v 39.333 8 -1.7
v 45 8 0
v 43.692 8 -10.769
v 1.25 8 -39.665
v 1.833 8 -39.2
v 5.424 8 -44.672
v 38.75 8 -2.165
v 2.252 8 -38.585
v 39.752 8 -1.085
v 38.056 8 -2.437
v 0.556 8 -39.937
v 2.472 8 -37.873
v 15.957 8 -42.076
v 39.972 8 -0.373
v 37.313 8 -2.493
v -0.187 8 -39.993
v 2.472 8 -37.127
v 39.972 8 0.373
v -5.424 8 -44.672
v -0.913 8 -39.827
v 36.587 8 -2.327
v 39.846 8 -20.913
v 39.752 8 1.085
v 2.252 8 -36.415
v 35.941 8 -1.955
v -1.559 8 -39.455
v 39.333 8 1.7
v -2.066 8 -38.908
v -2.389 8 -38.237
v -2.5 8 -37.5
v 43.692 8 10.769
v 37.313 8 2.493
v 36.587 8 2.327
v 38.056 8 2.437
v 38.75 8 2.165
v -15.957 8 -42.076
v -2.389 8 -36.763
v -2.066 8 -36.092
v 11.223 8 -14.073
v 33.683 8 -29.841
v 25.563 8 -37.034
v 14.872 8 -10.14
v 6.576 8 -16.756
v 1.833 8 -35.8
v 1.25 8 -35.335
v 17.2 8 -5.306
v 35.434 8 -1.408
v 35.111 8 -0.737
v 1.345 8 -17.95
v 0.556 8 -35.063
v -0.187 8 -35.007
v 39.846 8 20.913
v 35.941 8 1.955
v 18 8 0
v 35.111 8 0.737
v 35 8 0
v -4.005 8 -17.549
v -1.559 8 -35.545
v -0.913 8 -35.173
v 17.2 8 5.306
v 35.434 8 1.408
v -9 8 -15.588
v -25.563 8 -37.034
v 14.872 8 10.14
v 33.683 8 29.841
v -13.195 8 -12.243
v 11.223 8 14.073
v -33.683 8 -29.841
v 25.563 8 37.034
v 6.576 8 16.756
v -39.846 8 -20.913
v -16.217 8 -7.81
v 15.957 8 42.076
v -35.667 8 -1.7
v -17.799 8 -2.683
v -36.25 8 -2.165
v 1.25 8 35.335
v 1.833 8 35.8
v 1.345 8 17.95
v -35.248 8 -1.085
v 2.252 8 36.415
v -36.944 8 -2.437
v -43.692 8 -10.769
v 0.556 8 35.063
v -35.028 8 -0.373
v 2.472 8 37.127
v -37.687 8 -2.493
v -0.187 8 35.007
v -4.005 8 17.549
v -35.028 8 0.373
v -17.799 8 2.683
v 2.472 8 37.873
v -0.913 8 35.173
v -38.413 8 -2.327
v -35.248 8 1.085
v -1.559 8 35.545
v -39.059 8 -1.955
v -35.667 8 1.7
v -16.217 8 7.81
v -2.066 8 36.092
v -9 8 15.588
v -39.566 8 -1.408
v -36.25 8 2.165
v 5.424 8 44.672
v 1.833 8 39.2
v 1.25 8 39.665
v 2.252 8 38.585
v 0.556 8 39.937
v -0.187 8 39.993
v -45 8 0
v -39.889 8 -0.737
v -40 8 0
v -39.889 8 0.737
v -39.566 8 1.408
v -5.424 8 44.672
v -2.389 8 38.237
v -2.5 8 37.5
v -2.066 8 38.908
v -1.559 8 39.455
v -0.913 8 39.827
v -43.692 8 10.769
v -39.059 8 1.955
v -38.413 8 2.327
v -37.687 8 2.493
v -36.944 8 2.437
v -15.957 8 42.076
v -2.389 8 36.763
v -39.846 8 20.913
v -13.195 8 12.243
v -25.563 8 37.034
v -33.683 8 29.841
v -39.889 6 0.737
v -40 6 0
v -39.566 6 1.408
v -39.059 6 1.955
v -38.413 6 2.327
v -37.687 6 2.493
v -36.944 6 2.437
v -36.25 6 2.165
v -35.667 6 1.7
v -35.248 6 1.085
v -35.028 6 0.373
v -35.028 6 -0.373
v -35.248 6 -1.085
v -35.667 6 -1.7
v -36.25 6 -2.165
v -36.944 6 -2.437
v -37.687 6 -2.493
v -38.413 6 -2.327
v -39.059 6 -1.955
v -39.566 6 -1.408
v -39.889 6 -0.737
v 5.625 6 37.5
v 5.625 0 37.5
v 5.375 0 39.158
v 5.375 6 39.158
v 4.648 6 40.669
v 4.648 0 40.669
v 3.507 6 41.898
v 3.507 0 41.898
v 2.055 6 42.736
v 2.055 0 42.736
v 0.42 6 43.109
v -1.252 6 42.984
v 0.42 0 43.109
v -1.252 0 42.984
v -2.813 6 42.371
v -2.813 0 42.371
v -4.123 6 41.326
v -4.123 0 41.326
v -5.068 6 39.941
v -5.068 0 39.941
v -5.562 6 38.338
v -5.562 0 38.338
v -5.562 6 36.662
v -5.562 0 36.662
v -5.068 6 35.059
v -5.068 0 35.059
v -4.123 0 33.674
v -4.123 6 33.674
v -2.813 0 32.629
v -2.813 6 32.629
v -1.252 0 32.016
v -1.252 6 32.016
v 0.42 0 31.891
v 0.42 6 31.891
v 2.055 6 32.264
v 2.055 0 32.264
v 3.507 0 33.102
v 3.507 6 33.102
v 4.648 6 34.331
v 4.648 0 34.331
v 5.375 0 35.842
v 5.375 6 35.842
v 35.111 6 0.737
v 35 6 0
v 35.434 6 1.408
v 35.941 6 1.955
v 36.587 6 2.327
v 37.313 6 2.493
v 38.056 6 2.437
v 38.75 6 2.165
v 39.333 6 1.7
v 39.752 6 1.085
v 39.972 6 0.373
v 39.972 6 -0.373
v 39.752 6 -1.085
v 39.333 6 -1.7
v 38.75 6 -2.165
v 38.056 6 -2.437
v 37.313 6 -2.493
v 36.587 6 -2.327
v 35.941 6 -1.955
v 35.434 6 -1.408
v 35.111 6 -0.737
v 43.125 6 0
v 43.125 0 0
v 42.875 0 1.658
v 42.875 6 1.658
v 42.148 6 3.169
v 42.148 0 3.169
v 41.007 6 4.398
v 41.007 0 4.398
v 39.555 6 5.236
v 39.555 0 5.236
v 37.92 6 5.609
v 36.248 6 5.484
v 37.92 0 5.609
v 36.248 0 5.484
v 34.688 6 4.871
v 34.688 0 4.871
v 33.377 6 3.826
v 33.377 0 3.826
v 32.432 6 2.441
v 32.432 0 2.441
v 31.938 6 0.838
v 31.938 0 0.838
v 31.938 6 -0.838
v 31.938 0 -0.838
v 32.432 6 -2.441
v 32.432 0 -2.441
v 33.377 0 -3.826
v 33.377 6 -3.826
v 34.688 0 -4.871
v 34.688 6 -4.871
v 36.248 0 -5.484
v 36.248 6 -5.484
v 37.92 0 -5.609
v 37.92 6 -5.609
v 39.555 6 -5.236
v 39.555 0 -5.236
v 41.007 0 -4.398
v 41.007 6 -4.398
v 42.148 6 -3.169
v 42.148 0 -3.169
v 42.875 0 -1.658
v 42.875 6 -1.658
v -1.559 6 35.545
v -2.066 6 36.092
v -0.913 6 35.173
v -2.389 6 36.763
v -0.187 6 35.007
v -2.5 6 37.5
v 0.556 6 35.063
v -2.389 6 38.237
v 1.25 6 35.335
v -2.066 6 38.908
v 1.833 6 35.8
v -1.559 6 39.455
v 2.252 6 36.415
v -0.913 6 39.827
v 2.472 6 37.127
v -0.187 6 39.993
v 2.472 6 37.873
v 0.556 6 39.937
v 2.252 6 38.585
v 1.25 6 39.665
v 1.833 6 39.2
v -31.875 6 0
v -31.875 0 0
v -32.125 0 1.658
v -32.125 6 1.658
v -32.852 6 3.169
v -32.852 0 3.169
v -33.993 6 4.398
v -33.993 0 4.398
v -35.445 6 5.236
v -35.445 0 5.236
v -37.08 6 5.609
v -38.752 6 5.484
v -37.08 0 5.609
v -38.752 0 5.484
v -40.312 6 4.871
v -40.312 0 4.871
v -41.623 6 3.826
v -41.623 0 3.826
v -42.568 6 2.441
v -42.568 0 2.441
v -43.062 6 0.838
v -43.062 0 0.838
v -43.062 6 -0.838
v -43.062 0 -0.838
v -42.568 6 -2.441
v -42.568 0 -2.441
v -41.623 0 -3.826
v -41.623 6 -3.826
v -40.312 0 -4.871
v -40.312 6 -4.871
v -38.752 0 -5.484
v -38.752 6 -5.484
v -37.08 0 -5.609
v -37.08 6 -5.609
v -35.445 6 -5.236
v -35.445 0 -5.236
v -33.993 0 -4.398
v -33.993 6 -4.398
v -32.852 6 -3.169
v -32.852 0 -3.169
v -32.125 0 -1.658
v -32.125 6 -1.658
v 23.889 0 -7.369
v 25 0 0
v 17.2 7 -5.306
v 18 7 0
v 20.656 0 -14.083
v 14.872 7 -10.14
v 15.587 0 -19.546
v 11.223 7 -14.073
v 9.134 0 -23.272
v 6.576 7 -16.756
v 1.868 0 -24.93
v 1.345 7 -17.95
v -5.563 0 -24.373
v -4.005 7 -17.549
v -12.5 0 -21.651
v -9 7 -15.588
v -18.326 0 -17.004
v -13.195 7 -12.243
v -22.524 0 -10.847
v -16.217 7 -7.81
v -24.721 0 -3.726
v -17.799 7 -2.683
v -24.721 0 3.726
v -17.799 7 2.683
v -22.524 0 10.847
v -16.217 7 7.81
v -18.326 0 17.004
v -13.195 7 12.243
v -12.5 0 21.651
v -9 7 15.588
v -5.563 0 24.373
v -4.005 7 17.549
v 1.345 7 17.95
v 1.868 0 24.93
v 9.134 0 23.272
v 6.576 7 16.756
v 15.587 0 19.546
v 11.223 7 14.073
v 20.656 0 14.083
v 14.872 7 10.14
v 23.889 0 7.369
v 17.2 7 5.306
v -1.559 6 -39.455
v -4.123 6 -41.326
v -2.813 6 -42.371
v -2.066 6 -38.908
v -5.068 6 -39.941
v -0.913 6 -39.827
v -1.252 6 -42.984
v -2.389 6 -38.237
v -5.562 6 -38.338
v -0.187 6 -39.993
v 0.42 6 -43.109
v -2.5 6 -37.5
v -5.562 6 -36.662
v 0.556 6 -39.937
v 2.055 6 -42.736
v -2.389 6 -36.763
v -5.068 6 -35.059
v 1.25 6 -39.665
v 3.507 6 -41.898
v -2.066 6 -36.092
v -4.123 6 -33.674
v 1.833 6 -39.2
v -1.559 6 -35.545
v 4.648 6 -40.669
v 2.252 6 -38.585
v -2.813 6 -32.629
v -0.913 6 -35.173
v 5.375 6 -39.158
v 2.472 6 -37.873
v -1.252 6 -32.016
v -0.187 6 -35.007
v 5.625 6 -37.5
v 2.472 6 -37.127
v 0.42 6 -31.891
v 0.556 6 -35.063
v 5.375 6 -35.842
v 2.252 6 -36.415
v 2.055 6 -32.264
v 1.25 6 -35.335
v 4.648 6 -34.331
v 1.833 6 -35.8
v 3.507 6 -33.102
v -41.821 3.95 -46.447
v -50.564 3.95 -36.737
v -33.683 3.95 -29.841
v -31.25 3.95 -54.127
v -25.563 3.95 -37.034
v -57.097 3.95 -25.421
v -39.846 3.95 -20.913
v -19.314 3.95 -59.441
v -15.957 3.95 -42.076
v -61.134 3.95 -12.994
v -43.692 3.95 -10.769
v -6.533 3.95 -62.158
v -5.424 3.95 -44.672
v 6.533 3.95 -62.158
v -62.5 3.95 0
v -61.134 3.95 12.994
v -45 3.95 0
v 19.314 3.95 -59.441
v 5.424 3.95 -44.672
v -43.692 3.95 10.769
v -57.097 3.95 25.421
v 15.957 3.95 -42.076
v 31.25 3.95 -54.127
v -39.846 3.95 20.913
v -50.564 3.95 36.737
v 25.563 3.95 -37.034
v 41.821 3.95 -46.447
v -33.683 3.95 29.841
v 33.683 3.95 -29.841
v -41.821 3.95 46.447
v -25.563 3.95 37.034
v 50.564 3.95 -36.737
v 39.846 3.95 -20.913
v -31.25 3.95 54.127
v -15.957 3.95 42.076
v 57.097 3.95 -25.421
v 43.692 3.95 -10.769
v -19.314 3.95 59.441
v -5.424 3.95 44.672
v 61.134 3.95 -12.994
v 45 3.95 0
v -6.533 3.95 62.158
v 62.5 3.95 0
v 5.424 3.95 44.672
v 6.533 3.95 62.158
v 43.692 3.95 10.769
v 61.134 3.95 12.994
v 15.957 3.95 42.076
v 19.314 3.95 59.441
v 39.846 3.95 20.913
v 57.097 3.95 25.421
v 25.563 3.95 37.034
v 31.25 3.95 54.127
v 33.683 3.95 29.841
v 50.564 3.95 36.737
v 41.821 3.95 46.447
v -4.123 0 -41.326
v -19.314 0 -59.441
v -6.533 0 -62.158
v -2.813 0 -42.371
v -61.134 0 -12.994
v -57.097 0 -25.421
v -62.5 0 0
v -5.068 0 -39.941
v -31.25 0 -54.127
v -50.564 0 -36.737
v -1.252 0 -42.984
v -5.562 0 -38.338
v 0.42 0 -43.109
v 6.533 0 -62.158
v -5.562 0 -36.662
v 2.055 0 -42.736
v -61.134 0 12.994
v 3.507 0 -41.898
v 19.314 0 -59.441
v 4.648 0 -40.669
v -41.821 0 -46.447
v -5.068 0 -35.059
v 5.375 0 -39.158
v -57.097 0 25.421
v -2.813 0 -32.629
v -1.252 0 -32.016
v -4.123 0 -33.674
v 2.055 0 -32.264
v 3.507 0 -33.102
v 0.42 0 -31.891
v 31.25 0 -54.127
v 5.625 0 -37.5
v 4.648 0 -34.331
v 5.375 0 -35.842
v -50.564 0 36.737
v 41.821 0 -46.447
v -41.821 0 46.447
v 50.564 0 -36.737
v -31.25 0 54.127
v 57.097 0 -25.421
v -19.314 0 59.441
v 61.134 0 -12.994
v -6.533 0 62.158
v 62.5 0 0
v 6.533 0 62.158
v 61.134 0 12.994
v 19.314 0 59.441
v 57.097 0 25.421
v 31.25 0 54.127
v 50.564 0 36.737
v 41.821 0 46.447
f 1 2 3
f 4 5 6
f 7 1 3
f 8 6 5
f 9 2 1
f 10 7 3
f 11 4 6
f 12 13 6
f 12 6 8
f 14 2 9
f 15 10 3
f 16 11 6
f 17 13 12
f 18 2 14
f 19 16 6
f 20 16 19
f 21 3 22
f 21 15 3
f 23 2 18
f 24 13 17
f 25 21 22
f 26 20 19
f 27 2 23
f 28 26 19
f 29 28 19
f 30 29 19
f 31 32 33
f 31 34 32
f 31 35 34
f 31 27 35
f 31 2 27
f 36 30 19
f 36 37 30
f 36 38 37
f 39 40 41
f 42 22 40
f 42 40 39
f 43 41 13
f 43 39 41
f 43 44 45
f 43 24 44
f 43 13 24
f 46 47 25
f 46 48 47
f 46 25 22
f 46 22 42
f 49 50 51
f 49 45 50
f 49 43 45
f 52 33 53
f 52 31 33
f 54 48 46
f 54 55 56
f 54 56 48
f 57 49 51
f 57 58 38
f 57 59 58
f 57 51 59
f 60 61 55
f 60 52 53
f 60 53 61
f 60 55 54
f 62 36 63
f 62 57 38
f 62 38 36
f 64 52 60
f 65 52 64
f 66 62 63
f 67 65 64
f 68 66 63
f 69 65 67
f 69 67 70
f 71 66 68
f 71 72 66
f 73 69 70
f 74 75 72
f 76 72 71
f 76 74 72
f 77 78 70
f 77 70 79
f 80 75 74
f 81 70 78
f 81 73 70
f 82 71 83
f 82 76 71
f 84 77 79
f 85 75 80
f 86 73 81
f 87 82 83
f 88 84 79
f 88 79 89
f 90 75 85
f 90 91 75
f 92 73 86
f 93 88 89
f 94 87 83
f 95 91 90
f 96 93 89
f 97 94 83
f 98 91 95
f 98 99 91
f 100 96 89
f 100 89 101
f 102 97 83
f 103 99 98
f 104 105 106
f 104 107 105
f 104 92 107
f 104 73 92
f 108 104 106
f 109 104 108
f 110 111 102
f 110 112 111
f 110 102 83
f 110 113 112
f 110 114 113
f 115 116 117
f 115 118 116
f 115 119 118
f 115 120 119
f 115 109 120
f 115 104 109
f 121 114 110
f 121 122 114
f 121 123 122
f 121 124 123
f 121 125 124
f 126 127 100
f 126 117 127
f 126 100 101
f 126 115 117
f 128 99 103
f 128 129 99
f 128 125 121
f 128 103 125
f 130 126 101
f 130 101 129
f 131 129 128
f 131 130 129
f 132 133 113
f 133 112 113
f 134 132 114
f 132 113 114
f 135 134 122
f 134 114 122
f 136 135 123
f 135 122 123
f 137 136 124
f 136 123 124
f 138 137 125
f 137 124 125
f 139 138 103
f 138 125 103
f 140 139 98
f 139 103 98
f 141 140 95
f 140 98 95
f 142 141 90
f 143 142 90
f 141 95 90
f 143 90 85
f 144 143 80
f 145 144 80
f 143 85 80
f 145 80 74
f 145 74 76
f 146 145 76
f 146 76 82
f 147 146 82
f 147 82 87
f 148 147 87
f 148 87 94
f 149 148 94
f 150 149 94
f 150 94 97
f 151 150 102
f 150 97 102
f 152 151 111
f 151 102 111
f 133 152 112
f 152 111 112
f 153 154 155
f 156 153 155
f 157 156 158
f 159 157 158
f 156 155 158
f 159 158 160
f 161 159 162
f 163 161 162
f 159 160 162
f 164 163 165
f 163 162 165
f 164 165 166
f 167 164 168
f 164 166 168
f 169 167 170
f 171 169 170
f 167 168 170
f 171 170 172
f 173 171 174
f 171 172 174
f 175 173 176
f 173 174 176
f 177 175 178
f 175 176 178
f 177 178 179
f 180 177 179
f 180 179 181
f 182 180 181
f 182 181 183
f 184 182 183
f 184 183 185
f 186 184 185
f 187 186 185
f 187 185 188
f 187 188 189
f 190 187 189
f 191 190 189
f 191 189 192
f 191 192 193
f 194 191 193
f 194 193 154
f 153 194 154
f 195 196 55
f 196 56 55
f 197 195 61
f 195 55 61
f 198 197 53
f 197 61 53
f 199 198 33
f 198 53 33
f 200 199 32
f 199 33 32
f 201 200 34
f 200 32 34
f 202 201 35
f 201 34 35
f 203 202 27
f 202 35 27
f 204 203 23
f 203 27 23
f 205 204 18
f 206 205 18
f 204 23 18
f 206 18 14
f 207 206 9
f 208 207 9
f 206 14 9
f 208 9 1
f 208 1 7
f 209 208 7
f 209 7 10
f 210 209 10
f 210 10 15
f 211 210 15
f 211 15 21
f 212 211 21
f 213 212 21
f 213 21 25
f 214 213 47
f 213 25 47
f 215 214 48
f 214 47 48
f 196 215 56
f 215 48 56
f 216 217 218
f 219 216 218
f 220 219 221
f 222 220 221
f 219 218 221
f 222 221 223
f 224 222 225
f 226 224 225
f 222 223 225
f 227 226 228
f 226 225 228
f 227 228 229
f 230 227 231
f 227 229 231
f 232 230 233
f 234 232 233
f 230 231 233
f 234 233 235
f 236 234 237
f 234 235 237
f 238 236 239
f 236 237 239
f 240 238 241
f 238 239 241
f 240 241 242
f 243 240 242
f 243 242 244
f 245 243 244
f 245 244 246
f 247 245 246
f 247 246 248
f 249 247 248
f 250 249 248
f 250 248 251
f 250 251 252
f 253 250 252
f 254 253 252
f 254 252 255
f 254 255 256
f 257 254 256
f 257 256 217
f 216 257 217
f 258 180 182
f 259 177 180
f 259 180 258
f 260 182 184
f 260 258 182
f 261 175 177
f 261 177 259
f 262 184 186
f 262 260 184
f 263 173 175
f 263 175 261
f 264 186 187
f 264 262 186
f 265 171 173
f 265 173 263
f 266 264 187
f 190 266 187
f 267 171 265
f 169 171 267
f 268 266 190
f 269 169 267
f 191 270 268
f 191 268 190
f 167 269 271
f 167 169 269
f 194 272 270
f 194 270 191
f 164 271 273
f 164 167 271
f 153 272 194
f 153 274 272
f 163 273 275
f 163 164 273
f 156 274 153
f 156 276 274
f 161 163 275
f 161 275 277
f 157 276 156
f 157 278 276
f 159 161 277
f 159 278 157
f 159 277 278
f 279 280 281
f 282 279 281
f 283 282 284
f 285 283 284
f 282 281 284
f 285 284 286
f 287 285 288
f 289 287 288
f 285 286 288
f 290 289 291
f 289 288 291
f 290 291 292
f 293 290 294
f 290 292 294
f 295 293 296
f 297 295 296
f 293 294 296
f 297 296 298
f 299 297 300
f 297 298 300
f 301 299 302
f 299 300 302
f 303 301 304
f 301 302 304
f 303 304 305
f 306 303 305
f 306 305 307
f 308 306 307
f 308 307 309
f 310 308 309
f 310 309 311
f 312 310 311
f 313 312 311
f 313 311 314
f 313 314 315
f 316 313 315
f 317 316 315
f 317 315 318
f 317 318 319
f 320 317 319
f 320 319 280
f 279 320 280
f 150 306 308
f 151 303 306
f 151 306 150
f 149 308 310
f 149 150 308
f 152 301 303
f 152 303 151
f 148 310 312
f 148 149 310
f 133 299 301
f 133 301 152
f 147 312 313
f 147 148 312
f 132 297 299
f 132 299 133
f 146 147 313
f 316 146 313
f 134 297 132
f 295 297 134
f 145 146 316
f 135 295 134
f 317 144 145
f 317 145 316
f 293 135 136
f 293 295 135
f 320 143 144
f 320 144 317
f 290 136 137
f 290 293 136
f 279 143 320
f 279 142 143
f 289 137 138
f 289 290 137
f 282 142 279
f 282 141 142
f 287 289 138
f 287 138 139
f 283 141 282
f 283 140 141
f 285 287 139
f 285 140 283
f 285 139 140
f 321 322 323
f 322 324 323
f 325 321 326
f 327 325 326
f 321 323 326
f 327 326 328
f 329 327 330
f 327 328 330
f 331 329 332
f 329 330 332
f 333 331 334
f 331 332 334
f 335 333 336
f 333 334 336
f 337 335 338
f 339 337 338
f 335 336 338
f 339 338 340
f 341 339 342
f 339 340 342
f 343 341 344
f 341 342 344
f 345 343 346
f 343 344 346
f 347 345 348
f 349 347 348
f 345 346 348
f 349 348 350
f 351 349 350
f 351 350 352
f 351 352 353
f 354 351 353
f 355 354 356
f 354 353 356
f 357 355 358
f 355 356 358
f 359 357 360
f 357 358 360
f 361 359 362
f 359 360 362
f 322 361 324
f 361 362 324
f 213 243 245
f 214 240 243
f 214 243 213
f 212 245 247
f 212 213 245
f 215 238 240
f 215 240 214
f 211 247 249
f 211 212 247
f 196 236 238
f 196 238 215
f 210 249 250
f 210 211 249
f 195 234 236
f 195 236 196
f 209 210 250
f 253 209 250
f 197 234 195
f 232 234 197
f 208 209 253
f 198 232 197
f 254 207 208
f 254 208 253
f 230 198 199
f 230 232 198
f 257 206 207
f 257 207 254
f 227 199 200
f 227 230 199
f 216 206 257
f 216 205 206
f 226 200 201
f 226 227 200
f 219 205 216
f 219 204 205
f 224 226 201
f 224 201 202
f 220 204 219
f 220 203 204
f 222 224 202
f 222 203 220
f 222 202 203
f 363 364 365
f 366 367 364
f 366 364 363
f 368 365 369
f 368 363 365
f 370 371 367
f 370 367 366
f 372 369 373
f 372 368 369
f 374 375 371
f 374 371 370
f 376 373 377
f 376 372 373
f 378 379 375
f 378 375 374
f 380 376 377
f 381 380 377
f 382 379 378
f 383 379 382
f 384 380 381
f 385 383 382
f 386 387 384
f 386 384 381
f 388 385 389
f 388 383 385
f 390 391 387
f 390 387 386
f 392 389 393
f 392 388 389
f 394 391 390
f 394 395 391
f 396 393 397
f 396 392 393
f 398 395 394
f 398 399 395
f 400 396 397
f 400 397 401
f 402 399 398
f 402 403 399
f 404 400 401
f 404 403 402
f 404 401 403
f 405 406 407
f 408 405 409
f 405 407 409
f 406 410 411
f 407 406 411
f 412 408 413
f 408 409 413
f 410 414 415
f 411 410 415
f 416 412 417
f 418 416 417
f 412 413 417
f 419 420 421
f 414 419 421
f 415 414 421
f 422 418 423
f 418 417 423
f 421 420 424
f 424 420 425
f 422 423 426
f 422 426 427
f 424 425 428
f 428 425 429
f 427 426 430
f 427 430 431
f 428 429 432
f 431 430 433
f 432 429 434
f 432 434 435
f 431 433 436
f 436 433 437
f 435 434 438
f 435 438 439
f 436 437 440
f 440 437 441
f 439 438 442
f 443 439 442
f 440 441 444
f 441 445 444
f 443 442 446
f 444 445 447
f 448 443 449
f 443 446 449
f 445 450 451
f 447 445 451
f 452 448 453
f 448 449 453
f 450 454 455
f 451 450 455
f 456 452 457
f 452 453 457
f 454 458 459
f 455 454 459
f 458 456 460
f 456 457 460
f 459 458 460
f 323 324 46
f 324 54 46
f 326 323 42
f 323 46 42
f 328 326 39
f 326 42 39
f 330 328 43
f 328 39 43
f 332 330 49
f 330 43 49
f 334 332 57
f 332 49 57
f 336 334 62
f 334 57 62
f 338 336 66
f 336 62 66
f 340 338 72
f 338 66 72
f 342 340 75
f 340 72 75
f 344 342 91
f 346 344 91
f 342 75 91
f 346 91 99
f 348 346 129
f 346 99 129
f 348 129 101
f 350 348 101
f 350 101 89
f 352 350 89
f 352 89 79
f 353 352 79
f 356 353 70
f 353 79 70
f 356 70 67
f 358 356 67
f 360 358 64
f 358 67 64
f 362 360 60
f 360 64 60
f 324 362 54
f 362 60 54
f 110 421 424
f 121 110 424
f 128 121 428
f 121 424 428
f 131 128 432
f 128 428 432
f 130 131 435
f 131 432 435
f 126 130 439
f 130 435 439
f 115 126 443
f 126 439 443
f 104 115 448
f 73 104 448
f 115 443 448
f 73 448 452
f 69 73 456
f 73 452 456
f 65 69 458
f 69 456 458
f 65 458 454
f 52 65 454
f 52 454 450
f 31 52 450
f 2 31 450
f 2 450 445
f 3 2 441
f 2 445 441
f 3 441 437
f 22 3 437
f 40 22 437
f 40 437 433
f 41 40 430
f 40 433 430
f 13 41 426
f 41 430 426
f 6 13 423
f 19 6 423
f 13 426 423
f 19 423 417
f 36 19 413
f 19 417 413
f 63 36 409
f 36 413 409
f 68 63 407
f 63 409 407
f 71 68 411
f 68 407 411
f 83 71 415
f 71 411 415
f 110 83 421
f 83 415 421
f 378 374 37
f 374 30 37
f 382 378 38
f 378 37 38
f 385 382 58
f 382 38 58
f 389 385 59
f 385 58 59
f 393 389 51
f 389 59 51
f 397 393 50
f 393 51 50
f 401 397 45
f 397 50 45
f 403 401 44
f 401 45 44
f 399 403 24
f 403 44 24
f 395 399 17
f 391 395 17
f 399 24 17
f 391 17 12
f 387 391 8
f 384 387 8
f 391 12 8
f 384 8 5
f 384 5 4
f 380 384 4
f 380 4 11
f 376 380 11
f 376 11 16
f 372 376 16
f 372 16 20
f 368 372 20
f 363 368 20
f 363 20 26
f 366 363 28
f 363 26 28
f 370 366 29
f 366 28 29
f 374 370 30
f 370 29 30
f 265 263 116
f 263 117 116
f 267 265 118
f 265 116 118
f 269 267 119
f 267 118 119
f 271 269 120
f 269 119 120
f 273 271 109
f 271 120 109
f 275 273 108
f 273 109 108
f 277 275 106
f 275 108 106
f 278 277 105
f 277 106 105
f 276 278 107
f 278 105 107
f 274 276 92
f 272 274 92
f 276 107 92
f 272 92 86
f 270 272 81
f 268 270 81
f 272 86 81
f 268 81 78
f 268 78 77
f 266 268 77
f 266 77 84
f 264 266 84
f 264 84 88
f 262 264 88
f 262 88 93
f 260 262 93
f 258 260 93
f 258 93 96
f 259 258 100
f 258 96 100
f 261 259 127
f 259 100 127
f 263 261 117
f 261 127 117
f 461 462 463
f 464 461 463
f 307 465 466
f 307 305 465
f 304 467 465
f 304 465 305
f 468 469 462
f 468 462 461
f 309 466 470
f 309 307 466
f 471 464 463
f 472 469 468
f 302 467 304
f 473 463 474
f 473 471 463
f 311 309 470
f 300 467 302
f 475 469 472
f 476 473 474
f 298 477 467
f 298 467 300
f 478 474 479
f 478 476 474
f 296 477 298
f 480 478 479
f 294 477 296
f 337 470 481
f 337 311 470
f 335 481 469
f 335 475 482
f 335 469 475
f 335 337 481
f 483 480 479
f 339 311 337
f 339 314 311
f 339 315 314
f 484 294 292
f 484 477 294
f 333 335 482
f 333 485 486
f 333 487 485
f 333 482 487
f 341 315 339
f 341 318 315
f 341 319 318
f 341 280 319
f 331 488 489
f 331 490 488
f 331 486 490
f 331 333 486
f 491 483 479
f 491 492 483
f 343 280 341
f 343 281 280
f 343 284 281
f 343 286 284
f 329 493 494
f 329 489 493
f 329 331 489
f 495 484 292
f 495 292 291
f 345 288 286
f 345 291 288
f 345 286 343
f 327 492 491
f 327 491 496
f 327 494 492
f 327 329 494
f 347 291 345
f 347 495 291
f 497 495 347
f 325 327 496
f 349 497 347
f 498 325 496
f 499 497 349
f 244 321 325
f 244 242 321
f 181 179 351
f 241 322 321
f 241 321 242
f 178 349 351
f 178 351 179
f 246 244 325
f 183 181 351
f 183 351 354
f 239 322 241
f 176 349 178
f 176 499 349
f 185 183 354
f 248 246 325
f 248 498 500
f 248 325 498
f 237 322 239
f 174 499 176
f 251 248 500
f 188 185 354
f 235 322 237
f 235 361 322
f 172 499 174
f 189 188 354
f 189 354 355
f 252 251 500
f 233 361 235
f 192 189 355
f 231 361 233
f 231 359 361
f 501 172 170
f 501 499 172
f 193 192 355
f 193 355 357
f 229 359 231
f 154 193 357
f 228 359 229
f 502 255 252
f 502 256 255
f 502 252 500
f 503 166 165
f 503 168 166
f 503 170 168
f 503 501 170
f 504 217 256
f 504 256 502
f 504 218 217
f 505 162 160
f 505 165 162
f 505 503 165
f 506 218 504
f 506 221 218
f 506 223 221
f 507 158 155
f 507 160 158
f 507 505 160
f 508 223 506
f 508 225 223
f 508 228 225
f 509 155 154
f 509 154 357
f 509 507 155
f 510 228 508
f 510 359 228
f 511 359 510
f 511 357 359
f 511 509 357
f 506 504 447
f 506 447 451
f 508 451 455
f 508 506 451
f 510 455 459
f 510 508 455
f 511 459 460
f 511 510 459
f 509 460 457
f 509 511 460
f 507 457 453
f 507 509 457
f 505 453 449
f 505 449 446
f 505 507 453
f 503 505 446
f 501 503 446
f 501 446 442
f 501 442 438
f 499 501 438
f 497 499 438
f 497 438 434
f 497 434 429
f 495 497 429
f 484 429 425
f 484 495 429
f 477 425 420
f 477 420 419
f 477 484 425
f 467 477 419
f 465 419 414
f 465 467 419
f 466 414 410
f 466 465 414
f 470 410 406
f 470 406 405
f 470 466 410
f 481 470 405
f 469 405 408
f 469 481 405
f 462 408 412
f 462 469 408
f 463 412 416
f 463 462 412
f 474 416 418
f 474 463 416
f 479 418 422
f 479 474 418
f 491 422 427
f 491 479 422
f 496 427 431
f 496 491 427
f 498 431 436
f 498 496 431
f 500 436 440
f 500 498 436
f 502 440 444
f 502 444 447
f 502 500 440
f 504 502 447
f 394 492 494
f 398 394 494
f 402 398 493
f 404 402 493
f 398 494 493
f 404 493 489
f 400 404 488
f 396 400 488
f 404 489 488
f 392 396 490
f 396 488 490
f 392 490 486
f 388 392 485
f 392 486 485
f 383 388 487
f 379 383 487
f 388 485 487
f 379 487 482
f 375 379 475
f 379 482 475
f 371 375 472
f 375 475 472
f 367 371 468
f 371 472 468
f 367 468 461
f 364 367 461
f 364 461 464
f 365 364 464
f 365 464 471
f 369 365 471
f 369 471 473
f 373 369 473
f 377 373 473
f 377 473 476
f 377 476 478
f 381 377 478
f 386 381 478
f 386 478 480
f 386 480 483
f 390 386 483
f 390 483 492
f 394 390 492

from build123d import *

# Parameters (mm, degrees)
F0_R           = 62.5
F1_DEPTH       = 3.95
F2_R           = 45
F3_DEPTH       = 4.05
F6_D           = 5
F6_DEPTH       = 24.25
F6_CBORE_D     = 11.25
F6_CBORE_DEPTH = 6
F6_TIP         = 1.5021515476


with BuildPart() as f1:
    # F0 (on Front) → F1 (new body)
    with BuildSketch(Plane.XZ):
        Circle(F0_R)
    extrude(amount=-F1_DEPTH)

    # F2 (on face) → F3 (join)
    with BuildSketch(Plane(origin=(0, 3.95, 0), x_dir=(-1, 0, 0), z_dir=(0, 1, 0))):
        Circle(F2_R)
    extrude(amount=F3_DEPTH)

    # F4 (on Top) → F5 (revolve, cut)
    with BuildSketch(Plane.XY):
        Polygon((0, 8), (0, 0), (25, 0), (18, 7), (18, 8), align=None)
    revolve(axis=Axis((0, 4, 0), (0, 1, 0)), mode=Mode.SUBTRACT)

    # F6
    with Locations(Plane.XZ):
        with Locations((37.5, 0), (0, -37.5), (-37.5, 0), (0, 37.5)):
            CounterBoreHole(F6_D / 2, F6_CBORE_D / 2, F6_CBORE_DEPTH, depth=F6_DEPTH)
            with Locations((0, 0, -(F6_DEPTH + F6_TIP / 2))):  # 118° drill point
                Cone(0, F6_D / 2, F6_TIP, mode=Mode.SUBTRACT)


solid = f1.part
